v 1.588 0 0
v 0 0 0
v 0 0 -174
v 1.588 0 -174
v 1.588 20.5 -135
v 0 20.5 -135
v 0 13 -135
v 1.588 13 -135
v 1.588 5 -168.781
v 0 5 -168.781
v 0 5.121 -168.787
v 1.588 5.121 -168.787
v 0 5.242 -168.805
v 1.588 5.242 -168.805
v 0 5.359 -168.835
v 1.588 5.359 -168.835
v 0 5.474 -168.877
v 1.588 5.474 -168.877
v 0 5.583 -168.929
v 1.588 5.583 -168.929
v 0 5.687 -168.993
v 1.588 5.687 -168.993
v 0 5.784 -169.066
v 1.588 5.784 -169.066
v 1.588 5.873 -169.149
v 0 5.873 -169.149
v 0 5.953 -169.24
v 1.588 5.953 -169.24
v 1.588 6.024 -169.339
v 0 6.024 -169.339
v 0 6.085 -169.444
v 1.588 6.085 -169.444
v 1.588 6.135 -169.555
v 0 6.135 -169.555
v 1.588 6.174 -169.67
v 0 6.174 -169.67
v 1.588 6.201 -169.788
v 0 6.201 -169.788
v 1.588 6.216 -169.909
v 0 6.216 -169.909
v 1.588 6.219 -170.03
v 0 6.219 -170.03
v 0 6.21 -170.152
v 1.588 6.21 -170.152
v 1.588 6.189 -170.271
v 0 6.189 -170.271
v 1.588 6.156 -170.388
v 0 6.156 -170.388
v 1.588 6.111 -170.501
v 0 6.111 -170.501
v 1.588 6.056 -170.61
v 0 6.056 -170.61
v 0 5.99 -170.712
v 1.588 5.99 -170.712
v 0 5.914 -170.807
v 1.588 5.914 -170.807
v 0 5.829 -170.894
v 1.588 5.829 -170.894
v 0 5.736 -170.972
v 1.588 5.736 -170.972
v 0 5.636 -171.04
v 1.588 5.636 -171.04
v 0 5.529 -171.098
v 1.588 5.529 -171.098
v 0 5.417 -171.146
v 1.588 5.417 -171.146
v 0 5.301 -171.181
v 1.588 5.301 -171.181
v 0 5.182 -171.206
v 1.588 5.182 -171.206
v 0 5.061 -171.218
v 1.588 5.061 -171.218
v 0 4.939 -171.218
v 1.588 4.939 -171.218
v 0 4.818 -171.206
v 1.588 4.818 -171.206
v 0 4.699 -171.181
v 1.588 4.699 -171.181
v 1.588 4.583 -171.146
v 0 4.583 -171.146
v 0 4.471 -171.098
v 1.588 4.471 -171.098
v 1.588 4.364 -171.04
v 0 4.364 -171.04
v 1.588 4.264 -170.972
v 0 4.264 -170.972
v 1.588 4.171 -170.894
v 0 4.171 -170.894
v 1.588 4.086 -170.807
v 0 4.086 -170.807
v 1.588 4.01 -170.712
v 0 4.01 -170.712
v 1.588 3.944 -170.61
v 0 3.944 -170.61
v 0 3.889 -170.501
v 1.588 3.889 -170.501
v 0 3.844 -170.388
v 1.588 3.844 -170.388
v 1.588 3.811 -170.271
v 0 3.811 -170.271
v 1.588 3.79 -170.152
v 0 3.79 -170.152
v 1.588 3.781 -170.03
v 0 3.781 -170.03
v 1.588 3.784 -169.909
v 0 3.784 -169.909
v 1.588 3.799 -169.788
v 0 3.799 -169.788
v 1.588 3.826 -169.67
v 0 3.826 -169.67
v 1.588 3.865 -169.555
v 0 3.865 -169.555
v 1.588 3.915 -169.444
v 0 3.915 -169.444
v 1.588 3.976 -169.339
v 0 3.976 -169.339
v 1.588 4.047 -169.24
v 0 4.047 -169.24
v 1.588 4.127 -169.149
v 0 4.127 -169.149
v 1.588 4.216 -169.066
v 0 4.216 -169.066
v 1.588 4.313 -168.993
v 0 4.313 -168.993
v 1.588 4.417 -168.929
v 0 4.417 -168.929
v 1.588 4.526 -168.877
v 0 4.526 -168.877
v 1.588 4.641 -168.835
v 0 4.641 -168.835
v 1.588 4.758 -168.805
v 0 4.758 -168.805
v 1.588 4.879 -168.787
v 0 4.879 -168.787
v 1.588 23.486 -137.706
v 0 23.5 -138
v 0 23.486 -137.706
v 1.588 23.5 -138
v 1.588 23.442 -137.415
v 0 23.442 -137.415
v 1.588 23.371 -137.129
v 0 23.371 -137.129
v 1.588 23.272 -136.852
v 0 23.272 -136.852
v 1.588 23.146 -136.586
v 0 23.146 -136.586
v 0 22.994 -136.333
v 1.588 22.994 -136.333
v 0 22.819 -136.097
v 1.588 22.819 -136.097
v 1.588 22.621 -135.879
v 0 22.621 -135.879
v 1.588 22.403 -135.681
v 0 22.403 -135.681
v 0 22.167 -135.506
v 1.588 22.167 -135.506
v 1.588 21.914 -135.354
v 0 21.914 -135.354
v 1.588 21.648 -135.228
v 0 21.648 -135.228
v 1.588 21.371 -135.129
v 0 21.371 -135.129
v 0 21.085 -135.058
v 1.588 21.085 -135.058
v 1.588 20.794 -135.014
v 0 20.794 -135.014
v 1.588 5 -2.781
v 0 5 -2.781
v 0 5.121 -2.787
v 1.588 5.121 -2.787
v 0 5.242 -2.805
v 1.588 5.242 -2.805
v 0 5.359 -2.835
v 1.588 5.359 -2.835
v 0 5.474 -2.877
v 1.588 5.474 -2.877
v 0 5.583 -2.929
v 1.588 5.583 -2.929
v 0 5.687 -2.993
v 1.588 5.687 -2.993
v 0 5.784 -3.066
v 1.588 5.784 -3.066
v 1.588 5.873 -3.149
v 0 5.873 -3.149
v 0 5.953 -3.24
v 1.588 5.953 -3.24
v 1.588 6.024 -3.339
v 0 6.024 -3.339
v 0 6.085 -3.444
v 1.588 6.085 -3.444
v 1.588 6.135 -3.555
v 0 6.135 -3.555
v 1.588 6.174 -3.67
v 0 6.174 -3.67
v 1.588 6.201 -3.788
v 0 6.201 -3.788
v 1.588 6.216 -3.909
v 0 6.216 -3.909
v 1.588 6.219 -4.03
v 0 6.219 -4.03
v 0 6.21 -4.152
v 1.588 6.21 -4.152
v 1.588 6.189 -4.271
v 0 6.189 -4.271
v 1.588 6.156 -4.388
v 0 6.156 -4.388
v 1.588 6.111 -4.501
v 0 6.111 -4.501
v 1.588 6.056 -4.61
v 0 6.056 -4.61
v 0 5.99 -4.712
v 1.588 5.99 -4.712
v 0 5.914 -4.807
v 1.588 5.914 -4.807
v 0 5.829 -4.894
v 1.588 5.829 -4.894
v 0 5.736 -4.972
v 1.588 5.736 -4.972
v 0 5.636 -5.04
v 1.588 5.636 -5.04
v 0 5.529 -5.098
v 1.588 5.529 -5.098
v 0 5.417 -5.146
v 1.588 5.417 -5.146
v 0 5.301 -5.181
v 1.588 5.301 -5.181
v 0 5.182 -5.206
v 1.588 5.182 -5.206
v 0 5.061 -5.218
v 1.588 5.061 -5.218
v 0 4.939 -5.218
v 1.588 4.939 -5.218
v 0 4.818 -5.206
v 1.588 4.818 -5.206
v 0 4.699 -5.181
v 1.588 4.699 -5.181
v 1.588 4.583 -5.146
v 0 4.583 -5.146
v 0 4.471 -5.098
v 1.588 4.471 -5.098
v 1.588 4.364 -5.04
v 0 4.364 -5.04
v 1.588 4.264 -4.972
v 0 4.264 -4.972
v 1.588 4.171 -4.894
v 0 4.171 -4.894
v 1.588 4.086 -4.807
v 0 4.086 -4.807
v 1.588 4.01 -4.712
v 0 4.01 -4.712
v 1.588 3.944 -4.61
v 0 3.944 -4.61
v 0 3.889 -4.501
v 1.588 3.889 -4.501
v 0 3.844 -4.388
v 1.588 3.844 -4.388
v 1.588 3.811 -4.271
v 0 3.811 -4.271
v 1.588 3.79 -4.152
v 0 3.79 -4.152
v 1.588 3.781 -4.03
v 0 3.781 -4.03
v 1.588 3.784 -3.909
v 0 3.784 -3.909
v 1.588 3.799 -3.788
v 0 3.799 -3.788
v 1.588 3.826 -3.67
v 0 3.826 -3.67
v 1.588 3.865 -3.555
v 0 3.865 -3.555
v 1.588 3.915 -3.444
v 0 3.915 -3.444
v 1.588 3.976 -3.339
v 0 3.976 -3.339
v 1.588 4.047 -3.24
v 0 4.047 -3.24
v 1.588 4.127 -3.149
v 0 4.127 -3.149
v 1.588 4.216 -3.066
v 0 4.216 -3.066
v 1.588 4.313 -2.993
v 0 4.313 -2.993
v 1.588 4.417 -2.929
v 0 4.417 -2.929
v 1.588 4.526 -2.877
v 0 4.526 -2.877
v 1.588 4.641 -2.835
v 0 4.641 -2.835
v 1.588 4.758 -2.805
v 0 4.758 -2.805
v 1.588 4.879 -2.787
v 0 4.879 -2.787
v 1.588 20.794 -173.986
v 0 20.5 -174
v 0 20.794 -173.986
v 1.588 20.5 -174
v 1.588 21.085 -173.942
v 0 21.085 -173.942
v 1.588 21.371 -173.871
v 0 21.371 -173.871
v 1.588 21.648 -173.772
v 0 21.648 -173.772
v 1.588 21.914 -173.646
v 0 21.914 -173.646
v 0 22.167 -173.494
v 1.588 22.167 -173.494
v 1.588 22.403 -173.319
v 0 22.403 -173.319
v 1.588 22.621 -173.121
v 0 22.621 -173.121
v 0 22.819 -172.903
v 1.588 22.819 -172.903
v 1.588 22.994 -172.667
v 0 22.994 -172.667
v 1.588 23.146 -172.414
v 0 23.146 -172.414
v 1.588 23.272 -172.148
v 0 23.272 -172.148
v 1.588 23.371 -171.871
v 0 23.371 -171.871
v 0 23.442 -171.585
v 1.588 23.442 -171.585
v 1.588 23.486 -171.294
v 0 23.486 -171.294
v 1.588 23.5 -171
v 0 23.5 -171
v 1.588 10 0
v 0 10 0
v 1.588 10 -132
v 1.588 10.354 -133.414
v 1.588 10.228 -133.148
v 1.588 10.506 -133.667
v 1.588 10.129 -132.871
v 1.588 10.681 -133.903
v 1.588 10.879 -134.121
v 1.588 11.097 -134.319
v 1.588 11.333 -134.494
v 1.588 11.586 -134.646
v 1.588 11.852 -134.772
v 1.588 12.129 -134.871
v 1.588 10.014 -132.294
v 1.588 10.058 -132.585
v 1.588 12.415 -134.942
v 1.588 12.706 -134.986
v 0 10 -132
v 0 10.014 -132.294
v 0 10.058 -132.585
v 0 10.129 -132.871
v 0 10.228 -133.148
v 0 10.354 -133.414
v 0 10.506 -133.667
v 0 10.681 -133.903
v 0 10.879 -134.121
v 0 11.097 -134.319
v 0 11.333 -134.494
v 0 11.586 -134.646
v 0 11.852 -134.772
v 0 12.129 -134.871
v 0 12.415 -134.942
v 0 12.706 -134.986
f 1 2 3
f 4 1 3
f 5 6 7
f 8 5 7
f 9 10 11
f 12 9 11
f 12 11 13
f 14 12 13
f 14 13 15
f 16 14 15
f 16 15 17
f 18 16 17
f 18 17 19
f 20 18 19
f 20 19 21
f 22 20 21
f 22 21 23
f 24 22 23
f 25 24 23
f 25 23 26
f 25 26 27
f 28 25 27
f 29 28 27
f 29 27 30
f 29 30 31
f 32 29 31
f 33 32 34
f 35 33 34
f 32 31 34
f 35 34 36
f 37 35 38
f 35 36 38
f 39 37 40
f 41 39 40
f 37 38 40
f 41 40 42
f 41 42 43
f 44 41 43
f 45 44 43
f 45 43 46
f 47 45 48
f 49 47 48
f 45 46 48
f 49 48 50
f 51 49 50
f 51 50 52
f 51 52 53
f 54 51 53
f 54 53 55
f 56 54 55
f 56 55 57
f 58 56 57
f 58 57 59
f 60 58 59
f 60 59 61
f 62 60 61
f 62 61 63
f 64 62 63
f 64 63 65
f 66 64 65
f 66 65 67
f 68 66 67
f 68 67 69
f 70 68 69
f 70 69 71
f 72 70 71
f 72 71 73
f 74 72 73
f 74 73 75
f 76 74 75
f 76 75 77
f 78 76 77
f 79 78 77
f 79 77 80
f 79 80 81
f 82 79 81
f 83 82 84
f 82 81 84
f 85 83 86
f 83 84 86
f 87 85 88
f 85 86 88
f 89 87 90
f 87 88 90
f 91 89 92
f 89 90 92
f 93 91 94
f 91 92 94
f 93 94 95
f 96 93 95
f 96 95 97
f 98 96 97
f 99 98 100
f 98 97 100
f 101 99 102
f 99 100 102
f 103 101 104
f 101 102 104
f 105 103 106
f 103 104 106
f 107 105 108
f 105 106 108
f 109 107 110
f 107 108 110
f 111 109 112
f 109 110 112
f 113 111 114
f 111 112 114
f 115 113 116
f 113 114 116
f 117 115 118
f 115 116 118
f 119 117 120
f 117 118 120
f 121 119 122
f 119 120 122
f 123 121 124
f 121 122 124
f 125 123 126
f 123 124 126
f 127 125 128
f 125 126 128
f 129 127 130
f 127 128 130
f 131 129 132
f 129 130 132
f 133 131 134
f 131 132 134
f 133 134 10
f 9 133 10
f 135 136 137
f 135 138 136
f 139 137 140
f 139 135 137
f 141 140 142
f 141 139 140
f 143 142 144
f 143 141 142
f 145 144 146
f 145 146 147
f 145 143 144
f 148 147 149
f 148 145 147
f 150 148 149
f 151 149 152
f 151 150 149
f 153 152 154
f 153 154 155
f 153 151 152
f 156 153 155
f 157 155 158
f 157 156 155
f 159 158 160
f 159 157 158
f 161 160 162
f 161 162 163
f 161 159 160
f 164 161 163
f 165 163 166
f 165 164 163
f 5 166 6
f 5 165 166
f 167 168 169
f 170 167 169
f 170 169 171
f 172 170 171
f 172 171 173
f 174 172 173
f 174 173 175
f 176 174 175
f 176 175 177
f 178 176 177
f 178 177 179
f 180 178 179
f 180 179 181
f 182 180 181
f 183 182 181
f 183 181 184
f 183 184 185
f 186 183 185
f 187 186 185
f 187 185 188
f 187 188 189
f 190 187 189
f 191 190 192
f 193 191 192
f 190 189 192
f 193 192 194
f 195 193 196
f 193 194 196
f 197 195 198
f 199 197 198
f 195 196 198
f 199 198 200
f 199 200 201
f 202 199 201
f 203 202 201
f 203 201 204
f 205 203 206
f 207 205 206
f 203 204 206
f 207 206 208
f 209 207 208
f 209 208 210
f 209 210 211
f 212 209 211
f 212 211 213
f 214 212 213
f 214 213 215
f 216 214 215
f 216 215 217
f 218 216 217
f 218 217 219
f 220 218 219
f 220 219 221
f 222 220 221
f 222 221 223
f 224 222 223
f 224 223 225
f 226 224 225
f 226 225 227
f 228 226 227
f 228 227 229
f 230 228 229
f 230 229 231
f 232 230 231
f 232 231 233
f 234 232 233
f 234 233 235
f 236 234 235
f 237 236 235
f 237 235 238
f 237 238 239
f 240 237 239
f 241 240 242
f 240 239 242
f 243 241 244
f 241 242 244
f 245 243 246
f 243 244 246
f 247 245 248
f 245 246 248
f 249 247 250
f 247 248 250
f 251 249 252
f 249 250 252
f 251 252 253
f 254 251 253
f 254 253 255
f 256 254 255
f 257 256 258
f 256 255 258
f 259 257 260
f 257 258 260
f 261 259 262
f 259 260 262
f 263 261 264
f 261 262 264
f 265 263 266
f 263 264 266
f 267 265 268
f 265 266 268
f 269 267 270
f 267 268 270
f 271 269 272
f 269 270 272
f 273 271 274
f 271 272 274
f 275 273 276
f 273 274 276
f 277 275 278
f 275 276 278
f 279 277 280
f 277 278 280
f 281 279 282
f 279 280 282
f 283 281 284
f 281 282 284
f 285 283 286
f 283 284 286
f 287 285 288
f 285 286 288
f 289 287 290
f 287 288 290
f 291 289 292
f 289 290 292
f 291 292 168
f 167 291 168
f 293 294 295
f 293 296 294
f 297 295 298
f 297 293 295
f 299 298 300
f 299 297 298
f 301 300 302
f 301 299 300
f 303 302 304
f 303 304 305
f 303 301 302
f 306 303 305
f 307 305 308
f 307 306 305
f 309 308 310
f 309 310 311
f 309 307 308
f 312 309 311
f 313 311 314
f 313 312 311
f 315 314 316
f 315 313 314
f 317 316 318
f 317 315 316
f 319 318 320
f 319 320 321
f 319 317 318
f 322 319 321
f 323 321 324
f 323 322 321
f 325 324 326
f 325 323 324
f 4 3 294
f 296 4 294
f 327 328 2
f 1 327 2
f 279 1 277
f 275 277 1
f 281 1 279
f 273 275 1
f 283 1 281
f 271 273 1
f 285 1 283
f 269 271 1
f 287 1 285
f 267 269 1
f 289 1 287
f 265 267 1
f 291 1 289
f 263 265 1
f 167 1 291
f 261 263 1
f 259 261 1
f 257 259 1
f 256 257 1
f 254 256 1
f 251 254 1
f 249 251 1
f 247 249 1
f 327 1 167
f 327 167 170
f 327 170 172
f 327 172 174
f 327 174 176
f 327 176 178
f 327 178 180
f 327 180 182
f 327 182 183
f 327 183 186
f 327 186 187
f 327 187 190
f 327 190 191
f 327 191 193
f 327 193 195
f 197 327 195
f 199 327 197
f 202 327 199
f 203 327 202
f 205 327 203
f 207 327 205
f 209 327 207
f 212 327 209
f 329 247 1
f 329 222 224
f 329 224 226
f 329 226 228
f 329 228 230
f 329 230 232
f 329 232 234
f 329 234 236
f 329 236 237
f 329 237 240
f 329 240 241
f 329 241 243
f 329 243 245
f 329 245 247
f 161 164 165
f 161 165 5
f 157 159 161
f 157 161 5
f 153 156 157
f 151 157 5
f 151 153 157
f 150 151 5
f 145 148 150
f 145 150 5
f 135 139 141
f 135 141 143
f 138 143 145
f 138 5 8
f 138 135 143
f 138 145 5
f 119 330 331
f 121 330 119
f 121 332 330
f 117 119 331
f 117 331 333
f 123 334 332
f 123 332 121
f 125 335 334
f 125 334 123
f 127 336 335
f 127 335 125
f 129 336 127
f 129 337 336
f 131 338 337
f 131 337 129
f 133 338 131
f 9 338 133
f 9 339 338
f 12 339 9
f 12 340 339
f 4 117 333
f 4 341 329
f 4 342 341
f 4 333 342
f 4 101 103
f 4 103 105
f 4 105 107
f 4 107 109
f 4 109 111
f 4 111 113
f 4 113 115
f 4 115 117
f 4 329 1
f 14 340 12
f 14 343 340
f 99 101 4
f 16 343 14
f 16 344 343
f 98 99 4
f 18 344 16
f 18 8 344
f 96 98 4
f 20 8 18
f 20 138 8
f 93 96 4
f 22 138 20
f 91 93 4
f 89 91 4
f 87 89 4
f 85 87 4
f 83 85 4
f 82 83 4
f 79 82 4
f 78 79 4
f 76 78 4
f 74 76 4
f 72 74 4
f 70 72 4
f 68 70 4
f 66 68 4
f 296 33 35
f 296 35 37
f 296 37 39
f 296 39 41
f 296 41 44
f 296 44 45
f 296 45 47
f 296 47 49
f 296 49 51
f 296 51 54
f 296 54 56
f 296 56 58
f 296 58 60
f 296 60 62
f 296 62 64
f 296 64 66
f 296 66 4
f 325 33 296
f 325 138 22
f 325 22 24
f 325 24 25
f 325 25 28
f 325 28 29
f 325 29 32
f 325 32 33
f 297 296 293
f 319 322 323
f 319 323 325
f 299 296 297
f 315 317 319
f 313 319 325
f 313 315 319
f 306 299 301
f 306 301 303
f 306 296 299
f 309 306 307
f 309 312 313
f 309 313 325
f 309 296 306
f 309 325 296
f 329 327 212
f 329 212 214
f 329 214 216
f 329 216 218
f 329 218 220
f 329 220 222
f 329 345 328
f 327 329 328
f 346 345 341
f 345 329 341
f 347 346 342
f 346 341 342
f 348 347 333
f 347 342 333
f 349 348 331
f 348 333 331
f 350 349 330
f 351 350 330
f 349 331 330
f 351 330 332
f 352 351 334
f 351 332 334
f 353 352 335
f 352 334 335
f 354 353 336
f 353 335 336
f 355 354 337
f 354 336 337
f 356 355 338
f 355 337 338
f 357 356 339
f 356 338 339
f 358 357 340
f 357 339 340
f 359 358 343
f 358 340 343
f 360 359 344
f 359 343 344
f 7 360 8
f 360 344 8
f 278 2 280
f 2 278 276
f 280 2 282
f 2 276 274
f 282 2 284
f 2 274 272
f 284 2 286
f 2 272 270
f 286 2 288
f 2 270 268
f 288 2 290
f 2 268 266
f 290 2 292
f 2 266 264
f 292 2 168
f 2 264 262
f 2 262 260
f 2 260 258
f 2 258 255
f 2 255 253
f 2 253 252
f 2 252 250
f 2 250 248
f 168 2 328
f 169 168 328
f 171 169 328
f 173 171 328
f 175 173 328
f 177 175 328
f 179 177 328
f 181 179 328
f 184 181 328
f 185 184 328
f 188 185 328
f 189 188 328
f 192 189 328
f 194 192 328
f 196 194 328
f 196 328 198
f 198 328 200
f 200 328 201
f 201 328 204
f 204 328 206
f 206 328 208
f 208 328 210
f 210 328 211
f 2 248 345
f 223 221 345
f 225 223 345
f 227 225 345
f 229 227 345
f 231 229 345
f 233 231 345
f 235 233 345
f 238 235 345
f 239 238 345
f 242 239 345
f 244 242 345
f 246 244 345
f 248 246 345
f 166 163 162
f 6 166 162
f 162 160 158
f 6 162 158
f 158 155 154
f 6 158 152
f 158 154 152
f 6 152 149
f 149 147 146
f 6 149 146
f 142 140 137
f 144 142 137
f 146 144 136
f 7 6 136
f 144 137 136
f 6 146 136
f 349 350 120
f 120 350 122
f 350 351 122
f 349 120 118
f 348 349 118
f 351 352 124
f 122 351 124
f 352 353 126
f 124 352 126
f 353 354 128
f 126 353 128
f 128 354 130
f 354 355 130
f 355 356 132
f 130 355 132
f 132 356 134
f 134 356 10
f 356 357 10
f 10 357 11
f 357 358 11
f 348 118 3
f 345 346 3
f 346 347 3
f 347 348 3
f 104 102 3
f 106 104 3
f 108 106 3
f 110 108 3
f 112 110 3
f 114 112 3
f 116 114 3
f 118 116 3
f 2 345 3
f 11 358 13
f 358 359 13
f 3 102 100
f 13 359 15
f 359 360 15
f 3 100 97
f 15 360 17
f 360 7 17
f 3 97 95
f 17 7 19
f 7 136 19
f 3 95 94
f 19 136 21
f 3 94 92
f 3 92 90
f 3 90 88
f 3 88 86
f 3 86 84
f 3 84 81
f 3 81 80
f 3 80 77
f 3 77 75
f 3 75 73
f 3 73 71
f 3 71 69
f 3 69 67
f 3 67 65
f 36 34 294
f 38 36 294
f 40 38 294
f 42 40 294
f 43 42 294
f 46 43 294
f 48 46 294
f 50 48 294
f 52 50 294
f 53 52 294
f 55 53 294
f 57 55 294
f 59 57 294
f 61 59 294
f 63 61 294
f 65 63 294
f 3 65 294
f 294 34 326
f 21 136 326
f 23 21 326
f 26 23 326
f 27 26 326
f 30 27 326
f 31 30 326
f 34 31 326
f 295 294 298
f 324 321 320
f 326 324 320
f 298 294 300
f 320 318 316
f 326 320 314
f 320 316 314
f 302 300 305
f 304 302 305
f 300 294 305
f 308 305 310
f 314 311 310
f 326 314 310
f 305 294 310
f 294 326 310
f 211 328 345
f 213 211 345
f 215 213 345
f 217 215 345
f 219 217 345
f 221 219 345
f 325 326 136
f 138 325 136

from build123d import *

# Parameters (mm, degrees)
BOSS_EXTRUDE1_DEPTH   = 1.5875
F_2_CLEARANCE_HOLE1_D = 2.4384
FILLET1_R             = 3


with BuildPart() as part:
    # Sketch1 → Boss-Extrude1 (new body)
    with BuildSketch(Plane(origin=(0, 0, 0), x_dir=(0, 0, -1), z_dir=(1, 0, 0))):
        Polygon((0, 0), (174, 0), (174, 23.5), (135, 23.5), (135, 10), (0, 10), align=None)
    extrude(amount=BOSS_EXTRUDE1_DEPTH)

    # #2 Clearance Hole1 (through all)
    with Locations(Plane(origin=(1.5875, 0, 0), x_dir=(0, 0, -1), z_dir=(1, 0, 0))):
        with Locations((4, 5), (170, 5)):
            Hole(F_2_CLEARANCE_HOLE1_D / 2)

    # Fillet1
    fillet1_edges = [part.edges().sort_by_distance(p)[0] for p in [
        (0.79375, 10, -135),
        (0.79375, 23.5, -135),
        (0.79375, 23.5, -174),
    ]]
    fillet(fillet1_edges, radius=FILLET1_R)


solid = part.part
